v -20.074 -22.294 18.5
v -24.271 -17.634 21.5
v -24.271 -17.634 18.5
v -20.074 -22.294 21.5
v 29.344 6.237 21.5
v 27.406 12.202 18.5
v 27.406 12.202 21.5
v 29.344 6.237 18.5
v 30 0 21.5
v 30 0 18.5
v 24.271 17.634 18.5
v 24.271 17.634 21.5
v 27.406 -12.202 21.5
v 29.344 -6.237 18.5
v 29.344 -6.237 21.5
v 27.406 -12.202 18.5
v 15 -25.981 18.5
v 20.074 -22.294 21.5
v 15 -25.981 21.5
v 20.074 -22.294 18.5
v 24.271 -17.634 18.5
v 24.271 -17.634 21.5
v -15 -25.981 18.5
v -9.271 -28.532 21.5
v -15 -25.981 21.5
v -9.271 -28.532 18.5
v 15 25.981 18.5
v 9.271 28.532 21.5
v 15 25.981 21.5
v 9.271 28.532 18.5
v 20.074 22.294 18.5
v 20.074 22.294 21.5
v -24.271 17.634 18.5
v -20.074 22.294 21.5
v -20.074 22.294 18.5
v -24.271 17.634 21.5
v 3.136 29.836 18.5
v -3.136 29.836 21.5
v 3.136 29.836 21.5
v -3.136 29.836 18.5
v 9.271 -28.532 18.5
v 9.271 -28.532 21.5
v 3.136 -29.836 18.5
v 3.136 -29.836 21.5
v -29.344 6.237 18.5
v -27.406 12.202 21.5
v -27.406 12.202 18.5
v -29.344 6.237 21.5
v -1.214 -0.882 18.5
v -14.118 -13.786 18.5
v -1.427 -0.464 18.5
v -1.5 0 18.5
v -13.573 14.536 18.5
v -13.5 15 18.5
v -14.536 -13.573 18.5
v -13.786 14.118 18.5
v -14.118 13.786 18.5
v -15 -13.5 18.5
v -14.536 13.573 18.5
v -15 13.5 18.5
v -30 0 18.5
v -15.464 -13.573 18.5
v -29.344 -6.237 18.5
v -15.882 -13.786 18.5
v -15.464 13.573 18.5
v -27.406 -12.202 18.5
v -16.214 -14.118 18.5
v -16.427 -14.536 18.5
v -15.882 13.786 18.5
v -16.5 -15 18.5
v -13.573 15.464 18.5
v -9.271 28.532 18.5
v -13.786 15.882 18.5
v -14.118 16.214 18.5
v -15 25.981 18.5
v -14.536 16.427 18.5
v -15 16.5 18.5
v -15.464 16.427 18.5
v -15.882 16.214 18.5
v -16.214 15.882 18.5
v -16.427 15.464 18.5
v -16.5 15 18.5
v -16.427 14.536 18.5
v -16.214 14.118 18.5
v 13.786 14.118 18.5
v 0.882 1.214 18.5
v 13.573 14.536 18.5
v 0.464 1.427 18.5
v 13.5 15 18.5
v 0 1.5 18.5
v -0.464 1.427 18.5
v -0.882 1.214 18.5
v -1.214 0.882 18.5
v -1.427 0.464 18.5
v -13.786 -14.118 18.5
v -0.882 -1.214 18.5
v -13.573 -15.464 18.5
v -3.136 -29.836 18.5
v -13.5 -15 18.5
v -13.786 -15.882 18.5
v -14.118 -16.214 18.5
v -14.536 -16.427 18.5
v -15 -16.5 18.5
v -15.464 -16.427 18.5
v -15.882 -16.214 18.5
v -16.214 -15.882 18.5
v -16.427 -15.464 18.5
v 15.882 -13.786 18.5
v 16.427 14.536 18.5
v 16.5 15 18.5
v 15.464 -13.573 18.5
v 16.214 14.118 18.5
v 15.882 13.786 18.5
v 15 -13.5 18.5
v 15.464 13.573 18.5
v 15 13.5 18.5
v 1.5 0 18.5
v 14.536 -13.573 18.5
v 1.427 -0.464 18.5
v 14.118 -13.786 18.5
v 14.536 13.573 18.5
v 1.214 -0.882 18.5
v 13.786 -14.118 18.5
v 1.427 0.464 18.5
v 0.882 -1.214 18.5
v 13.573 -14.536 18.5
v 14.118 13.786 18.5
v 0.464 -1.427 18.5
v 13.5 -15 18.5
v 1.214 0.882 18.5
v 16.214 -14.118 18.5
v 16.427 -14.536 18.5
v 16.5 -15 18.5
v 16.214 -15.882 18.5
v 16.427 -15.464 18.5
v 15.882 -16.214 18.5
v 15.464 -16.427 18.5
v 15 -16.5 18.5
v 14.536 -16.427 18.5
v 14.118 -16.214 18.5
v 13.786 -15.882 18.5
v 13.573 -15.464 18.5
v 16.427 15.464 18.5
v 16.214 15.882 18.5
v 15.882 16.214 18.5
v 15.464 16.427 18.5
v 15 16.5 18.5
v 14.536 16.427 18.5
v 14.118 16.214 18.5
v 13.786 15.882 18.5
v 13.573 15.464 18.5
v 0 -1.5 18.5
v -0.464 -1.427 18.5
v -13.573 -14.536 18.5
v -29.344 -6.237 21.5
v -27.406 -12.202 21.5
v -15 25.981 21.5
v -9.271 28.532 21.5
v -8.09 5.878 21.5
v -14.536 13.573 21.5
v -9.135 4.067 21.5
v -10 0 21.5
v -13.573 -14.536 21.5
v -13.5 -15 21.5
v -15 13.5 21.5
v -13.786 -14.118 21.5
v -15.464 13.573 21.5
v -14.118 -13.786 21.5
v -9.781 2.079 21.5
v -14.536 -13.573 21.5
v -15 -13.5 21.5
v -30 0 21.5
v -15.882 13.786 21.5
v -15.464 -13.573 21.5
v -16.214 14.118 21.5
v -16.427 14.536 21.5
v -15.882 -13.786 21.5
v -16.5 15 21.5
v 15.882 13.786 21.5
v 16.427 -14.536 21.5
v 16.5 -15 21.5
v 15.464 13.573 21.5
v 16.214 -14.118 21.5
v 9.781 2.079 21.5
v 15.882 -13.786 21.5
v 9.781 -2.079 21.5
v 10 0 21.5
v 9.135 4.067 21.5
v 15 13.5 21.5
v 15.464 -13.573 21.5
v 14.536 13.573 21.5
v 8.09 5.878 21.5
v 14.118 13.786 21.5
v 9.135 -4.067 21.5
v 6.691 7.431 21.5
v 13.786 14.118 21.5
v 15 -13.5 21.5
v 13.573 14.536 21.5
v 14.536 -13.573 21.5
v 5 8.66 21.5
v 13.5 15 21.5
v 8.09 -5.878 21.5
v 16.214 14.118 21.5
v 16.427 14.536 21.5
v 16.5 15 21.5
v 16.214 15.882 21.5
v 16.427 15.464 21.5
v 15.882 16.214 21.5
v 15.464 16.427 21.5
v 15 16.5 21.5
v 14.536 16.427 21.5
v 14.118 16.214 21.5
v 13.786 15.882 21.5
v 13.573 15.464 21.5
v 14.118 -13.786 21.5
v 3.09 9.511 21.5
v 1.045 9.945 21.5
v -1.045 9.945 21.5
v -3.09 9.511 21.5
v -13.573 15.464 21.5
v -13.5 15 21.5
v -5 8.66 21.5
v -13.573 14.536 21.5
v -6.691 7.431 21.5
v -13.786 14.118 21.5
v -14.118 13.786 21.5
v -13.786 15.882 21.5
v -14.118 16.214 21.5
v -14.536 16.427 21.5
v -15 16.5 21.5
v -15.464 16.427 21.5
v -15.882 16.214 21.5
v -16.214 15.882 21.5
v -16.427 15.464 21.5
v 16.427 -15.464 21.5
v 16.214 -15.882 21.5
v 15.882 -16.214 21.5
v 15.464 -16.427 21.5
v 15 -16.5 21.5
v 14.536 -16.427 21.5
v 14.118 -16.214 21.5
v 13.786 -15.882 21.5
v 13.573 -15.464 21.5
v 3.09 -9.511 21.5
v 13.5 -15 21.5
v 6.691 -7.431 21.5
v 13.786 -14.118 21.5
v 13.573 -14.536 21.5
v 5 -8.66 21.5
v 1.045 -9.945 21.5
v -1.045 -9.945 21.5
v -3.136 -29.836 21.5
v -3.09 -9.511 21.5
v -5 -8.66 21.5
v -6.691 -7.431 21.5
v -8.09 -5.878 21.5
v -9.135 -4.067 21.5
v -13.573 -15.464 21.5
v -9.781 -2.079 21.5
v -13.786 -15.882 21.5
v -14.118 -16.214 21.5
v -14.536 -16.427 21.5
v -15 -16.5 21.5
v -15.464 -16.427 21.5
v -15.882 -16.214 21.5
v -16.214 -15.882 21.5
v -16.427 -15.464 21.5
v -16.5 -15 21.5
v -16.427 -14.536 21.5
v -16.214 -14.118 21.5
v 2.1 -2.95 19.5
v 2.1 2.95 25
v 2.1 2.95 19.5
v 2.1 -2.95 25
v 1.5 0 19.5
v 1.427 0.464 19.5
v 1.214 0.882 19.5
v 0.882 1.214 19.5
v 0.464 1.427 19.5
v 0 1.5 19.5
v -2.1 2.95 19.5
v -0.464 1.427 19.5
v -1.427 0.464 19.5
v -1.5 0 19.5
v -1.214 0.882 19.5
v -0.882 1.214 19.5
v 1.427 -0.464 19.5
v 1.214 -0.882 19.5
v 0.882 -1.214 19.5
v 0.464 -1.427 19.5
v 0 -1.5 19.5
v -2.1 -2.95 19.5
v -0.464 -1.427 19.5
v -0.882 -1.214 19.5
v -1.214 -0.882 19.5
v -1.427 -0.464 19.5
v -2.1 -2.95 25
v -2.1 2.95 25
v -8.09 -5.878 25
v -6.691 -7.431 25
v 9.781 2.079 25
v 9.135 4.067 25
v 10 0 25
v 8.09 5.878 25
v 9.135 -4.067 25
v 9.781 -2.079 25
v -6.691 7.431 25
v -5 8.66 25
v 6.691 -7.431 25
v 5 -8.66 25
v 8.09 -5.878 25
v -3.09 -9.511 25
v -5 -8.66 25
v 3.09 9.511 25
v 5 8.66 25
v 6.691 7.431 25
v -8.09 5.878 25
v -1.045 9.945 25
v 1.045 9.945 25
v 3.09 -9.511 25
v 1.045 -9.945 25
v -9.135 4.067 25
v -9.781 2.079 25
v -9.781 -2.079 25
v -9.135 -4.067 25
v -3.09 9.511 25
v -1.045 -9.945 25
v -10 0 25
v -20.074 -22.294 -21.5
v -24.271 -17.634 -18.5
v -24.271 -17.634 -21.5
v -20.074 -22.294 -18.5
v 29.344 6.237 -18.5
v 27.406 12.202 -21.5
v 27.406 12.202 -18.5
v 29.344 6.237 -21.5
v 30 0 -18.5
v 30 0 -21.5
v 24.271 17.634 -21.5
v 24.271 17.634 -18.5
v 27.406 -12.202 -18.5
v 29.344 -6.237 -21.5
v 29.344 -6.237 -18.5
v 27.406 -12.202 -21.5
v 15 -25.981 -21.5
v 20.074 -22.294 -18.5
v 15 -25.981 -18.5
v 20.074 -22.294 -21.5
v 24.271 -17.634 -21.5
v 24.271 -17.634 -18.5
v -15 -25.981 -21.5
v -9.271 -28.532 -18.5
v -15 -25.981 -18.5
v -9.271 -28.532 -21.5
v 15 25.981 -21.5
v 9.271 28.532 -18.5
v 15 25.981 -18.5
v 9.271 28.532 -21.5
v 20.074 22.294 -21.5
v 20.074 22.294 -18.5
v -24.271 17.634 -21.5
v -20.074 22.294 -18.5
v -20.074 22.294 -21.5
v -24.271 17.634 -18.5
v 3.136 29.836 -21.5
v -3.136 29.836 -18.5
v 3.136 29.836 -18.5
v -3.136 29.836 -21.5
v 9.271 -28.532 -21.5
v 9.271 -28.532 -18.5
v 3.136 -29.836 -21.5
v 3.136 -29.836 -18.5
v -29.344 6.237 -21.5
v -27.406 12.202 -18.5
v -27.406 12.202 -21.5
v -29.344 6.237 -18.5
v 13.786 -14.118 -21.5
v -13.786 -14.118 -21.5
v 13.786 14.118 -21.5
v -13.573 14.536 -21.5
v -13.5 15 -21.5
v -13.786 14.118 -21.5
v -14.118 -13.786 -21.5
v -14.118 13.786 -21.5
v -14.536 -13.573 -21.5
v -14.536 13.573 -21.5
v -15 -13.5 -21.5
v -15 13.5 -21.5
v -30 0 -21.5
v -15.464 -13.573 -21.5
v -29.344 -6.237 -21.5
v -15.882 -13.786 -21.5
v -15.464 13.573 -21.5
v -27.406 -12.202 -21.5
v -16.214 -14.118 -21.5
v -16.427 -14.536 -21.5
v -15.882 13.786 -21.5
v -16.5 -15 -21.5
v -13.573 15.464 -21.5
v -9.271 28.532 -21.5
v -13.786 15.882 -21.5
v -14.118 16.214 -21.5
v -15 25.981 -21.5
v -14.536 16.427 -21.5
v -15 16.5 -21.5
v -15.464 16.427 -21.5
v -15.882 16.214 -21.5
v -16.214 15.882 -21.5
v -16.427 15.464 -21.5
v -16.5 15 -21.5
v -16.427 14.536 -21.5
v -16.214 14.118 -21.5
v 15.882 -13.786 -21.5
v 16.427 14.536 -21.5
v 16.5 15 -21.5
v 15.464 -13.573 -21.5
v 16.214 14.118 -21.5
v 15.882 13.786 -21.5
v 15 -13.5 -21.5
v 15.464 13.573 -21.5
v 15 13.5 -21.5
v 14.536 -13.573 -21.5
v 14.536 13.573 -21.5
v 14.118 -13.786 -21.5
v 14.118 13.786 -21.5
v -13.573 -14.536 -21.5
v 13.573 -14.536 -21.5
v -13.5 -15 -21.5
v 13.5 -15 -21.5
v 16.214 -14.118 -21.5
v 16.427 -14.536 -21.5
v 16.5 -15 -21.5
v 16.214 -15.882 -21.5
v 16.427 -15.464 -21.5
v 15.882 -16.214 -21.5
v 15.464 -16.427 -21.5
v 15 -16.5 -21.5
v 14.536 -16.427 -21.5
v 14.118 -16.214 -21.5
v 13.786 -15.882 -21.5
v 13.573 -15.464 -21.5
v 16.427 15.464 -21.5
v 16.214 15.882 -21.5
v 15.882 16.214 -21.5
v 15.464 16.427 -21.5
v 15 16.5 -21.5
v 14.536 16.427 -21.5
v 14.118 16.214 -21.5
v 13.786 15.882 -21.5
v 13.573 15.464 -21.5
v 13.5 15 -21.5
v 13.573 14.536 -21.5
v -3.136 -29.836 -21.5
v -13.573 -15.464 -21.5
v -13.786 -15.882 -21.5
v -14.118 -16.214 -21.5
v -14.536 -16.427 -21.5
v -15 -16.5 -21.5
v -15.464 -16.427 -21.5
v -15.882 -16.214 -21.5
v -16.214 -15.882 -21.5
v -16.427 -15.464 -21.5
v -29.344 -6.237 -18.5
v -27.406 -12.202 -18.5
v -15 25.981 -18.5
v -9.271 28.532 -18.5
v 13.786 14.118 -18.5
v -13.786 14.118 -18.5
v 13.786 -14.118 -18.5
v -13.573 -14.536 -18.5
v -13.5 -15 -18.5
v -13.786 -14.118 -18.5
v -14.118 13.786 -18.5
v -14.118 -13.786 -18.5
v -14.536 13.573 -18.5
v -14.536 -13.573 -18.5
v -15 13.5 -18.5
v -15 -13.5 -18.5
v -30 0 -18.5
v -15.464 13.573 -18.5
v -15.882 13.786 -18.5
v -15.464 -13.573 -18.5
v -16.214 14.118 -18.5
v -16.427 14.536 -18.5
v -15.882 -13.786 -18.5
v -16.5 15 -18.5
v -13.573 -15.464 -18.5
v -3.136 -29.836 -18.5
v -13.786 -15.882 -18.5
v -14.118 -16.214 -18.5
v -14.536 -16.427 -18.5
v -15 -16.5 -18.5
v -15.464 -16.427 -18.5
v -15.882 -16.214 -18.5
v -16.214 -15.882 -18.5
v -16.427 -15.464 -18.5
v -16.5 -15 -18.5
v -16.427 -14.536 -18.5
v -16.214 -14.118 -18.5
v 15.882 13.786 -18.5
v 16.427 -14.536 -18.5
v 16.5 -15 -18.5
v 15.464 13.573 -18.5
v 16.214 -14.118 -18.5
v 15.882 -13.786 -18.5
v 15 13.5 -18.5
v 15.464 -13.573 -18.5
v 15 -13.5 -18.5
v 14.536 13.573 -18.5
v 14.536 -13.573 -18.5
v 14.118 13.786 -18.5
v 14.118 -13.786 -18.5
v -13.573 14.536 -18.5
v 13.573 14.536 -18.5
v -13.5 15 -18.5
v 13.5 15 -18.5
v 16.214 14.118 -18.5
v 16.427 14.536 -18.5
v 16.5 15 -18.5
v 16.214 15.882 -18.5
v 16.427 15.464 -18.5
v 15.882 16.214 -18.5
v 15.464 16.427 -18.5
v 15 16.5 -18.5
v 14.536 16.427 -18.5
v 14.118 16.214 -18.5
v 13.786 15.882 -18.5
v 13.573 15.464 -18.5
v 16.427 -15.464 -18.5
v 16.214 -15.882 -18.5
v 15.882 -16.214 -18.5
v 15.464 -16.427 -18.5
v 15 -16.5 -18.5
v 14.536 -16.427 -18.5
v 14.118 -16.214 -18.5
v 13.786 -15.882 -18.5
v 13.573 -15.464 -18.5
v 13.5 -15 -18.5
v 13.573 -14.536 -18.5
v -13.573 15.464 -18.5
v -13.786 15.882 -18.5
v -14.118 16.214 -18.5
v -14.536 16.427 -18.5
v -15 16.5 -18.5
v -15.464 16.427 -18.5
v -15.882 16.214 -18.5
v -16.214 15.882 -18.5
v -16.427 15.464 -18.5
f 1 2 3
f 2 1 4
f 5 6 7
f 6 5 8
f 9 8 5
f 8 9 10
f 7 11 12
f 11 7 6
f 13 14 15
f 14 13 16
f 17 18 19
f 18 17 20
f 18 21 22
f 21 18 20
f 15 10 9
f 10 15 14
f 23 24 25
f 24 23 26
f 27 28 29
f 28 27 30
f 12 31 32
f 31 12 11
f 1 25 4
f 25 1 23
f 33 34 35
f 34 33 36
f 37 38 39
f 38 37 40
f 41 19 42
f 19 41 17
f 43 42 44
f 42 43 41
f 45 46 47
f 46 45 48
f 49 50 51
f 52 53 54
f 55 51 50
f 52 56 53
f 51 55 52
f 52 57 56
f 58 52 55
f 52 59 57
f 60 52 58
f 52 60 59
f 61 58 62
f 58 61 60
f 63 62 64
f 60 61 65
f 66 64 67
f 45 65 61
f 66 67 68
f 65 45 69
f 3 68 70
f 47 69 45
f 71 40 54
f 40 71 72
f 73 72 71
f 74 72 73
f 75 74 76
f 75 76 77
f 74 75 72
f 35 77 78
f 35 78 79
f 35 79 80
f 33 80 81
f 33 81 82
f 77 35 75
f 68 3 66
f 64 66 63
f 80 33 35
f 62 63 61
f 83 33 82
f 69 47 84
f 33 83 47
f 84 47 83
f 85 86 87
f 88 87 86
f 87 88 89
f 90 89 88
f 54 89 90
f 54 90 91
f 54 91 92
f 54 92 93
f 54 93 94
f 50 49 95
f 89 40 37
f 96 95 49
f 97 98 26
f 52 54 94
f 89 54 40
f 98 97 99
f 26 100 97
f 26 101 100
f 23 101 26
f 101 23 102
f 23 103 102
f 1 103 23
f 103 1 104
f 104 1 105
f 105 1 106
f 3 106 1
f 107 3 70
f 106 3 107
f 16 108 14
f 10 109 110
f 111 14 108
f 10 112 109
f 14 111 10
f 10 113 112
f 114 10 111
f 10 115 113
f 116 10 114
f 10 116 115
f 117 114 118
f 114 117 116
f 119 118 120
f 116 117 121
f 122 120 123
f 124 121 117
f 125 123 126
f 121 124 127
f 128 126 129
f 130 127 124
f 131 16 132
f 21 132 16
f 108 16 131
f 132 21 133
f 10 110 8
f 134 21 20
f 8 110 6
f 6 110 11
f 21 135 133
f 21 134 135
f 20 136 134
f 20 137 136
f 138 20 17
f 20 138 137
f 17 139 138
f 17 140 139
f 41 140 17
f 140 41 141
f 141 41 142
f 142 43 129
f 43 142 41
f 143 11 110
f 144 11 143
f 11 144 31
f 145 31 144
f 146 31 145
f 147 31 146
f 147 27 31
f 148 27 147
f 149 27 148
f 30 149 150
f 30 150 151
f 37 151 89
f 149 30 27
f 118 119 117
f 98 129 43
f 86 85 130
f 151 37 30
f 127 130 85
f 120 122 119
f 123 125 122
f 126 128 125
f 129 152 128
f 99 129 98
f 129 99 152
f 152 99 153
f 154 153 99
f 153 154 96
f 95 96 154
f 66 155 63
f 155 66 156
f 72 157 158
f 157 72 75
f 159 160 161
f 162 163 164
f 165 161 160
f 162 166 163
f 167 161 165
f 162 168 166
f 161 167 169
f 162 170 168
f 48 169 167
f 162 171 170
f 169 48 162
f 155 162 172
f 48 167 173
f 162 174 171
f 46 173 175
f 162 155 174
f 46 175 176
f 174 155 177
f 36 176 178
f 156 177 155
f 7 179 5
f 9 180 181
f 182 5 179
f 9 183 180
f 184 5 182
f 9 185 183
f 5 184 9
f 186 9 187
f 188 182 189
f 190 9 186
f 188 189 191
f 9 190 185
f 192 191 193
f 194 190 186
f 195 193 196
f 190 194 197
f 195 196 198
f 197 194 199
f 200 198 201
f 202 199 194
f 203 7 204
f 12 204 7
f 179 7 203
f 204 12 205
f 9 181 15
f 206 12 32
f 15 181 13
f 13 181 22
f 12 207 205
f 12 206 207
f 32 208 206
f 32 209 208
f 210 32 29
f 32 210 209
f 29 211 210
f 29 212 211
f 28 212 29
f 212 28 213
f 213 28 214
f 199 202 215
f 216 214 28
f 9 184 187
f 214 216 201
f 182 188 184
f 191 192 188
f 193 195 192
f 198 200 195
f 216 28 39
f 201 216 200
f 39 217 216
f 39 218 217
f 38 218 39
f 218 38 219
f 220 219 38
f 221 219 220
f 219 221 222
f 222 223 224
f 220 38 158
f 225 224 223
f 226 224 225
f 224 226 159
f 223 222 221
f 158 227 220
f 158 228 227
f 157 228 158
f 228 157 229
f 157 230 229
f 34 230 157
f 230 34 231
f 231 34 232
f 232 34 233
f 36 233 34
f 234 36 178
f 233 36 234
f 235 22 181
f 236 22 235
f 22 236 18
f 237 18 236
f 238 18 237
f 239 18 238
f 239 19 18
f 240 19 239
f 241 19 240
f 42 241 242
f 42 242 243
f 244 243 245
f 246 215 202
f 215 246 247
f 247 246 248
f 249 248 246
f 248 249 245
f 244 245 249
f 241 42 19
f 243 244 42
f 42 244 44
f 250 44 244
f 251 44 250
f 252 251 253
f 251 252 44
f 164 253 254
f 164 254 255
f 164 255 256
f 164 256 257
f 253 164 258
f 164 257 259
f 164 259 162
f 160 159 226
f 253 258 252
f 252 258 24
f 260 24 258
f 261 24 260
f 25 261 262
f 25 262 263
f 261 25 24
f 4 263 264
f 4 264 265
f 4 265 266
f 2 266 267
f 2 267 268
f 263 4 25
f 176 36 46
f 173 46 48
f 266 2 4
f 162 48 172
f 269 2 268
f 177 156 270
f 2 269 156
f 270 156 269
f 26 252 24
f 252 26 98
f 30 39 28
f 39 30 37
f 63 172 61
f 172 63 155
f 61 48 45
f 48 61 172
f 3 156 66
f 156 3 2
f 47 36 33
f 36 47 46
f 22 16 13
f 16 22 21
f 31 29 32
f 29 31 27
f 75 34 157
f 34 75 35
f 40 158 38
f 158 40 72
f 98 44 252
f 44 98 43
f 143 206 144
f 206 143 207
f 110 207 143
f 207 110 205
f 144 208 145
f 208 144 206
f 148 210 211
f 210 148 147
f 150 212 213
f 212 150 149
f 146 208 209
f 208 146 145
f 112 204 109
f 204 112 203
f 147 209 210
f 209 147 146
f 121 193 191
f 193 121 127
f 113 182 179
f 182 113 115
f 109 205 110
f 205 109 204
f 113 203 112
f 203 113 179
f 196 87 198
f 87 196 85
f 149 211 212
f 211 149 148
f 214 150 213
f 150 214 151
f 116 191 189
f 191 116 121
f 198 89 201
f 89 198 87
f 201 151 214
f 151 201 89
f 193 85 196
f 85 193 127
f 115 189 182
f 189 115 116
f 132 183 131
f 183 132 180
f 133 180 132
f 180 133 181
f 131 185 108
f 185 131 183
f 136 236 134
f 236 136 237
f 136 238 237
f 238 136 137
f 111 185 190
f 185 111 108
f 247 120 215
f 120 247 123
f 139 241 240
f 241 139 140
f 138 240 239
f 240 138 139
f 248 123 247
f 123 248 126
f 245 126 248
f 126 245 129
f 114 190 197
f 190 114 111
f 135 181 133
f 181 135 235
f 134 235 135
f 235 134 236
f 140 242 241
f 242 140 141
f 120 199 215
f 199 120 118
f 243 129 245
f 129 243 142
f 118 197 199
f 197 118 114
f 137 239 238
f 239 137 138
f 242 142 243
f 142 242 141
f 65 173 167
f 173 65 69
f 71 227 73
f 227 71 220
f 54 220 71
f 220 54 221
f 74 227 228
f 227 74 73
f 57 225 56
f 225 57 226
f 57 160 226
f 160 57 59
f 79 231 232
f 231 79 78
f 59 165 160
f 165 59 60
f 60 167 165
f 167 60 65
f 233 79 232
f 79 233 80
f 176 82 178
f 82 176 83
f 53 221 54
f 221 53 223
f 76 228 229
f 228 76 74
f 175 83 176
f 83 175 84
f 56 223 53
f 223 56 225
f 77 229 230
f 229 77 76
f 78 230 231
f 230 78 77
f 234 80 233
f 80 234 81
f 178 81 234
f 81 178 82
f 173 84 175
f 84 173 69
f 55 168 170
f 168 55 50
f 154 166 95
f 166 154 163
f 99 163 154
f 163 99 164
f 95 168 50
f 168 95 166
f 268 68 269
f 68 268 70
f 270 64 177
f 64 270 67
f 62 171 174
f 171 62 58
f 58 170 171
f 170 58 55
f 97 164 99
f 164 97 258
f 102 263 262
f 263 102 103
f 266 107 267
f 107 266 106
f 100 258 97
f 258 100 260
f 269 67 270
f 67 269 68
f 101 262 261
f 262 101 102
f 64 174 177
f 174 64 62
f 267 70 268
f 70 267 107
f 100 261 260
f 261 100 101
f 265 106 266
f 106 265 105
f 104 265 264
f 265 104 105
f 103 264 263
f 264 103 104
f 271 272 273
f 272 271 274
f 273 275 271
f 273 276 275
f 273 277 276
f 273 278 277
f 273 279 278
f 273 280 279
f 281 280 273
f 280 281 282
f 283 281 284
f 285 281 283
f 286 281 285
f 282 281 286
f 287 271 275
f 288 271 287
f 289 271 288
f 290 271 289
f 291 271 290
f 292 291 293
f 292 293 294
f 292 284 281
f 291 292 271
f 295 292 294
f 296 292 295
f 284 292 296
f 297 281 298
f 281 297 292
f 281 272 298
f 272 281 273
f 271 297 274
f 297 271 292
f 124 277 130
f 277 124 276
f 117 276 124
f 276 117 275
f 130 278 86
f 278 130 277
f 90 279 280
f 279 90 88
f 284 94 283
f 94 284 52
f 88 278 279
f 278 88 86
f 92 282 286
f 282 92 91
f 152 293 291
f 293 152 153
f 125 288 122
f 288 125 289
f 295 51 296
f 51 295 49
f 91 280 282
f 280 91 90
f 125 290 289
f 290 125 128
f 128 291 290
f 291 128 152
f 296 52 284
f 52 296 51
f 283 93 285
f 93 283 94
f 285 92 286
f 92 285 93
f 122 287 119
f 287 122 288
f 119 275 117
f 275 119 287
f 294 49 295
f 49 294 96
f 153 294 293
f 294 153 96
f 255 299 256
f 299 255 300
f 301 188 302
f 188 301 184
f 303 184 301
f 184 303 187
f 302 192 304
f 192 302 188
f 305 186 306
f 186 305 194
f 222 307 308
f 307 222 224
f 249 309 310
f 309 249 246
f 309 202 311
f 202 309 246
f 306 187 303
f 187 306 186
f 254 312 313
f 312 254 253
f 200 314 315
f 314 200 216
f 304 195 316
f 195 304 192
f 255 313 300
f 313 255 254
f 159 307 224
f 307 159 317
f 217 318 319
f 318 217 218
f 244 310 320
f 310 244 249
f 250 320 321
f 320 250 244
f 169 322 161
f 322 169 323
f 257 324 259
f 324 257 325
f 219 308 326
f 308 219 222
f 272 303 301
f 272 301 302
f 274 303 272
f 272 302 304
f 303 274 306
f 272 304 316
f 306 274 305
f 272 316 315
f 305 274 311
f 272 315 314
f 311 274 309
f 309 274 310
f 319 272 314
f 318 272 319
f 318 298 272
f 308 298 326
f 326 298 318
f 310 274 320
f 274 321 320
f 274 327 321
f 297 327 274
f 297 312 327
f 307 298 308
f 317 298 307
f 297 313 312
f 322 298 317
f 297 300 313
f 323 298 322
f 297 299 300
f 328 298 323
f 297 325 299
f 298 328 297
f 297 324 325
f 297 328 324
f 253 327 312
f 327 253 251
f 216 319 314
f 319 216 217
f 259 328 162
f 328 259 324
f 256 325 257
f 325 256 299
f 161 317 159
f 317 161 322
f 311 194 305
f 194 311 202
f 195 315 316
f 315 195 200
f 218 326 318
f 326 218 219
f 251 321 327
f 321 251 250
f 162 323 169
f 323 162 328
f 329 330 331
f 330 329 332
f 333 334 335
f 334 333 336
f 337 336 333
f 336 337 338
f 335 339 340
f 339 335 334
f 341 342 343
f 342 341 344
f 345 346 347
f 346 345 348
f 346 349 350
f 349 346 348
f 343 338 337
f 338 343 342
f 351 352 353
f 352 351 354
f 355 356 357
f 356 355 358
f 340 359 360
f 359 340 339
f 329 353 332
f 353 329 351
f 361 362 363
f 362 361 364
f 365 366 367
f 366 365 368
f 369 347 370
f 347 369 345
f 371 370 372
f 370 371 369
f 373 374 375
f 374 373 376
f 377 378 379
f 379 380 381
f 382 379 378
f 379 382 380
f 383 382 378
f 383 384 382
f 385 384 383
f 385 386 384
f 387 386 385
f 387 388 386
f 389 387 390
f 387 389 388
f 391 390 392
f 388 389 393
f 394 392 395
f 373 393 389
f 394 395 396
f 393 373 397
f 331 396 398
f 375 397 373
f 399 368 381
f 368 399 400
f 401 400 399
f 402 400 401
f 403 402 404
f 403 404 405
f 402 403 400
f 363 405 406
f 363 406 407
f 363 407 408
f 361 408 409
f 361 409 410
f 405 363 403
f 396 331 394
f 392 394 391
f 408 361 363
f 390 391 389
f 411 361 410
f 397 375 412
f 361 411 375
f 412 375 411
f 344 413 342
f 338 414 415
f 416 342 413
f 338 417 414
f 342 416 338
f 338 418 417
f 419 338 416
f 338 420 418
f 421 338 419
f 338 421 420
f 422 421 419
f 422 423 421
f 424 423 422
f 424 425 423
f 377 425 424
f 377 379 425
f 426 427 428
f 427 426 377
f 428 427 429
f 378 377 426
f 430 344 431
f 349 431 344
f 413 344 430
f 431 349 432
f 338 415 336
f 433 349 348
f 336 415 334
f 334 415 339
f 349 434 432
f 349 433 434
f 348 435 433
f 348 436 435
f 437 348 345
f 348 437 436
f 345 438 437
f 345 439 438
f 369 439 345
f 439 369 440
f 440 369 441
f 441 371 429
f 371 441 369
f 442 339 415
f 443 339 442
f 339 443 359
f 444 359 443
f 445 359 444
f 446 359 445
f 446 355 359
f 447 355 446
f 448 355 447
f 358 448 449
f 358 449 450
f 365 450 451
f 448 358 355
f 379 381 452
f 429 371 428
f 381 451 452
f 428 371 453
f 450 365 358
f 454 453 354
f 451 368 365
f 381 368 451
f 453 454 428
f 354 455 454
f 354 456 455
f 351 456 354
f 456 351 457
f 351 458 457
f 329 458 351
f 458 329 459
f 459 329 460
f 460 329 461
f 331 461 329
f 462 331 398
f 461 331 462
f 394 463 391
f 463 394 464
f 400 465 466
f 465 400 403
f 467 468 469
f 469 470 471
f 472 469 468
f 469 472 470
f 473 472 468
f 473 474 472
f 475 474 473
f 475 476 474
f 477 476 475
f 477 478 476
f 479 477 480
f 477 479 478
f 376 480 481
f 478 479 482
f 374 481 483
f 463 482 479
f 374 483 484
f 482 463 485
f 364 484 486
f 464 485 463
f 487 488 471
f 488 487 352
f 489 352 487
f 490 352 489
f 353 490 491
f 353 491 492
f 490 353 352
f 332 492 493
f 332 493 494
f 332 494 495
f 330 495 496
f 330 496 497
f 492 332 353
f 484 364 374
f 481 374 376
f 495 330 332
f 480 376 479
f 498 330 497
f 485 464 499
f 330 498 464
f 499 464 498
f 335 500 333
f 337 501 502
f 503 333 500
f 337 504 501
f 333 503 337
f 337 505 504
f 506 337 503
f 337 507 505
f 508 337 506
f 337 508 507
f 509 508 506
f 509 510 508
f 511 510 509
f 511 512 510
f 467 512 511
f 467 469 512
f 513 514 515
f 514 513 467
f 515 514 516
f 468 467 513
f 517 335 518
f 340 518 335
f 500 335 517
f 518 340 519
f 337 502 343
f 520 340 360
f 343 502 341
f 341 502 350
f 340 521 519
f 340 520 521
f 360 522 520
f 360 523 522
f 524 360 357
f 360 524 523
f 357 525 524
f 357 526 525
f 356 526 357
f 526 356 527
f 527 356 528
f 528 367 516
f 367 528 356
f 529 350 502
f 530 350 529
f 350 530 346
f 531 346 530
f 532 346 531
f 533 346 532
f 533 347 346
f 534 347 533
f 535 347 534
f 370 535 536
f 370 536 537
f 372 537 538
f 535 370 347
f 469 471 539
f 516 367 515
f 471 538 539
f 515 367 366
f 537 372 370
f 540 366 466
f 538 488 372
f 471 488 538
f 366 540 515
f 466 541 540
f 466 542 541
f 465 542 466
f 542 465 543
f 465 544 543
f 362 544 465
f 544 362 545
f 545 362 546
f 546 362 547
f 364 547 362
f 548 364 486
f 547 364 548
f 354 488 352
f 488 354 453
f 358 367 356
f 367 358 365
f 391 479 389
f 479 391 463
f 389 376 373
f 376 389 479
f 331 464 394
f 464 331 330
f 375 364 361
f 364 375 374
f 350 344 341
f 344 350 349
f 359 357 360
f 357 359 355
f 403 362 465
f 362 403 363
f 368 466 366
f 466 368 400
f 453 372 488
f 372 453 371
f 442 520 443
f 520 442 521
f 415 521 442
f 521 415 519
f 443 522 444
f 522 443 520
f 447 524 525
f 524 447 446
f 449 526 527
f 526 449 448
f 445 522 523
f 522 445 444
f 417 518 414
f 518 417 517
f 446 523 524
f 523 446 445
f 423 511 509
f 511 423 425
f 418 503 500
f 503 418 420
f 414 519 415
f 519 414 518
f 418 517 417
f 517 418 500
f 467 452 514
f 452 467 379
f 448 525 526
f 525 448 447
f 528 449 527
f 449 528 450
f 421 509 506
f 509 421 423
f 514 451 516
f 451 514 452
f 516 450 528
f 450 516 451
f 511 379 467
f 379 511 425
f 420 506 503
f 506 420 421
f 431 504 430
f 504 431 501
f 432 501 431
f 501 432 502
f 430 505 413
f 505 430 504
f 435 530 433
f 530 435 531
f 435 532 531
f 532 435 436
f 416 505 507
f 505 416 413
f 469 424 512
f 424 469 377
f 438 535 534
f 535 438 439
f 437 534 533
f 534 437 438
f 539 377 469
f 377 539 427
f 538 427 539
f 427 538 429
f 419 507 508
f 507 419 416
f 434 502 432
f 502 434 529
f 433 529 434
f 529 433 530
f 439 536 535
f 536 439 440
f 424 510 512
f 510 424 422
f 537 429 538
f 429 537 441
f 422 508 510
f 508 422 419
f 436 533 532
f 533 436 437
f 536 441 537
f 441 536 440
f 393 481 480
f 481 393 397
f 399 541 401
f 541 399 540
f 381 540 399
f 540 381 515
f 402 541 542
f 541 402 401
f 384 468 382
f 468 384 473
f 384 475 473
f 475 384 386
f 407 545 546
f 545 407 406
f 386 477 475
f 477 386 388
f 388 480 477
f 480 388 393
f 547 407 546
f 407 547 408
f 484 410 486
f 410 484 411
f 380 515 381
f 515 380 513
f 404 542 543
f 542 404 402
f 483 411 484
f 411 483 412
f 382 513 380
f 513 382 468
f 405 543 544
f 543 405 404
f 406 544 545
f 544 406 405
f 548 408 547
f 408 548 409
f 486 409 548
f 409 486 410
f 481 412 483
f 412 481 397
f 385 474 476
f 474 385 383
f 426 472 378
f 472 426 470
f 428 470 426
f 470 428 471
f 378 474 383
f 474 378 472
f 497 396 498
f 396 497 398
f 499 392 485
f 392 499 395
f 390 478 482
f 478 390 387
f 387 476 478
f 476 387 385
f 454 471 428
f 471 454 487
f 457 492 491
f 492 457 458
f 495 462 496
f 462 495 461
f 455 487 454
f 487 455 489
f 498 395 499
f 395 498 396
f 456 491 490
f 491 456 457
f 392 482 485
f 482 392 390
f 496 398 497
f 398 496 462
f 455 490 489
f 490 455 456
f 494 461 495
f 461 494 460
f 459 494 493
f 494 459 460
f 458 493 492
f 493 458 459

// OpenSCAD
module springTrigger(minRadius, maxRadius, vertexCount, startPoint, height) {
	function vertexAt(vertexIndex) = 
		let(fraction = vertexIndex / vertexCount)
		let(angle = fraction * 360) 
		let(lengthFraction = vertexIndex > startPoint ? fraction : startPoint / vertexCount)
		let(length = minRadius + lengthFraction * (maxRadius - minRadius)) 
		[cos(angle) * length, sin(angle) * length];
	
	range = [0:(vertexCount-1)];
	path = [for (i = range) i];
	vertices = [for (i = range) vertexAt(i)];

	linear_extrude(height = height) polygon(points=vertices, paths=[path]);
}

module drawSpring() {
	springTrigger(5,17, 500, 50, 8);
}

module drawTireScrewHole() {
	cylinder(h = 4, r=1.5, center=true, $fn = 20);
}

module drawSimpleTireCylinder() {
	difference() {
		cylinder(h = 3, r=30, center=true);
		translate([15, 15, 0]) drawTireScrewHole();
		translate([15, -15, 0]) drawTireScrewHole();
		translate([-15, 15, 0]) drawTireScrewHole();
		translate([-15, -15, 0]) drawTireScrewHole();
	}
}

module drawInnerTireCylinder() {
	difference() {
		drawSimpleTireCylinder();	
		translate([0, 0, 2]) cube([4.2,5.9,5], center = true);
		drawTireScrewHole();
	}

	
	difference() {
		translate ([0, 0, 2])cylinder(h = 6, r=10, center=true);
		cube([4.2,5.9,15], center = true);
	}
}

module drawOuterTireCylinder() {
	drawSimpleTireCylinder();
}

module drawTire() {
	tireWidth = 40;
	
	//cylinder(h = tireWidth, r=51, center=true);
	color([1,0,0]) translate([0, 0, tireWidth / 2]) drawInnerTireCylinder();
	color([1,0,0]) translate([0, 0, -tireWidth / 2]) drawOuterTireCylinder();
}

drawTire();

module drawAllParts() {
	color([1,1,1]) translate([0,27,0]) rotate([90,90,0]) drawSpring();
	
	tireDistance = 90;
	translate([0,-tireDistance,0]) rotate([90,90,0]) mirror([0,0,1]) drawTire();
	translate([0,tireDistance,0]) rotate([90,90,0]) drawTire();
	
	drawTheRest();
}

//drawAllParts();

// Moottorin kotelon leveä sivu: 22,5mm
// Moottorin kotelon pituus: 64,27mm

// Akselin etäisyys kotelon reunasta: 8,5mm
// Kotelo alkaa levenemään 36,75mm kohdalla

// Moottorin akselin kapea sivu: 3,7mm, leveä sivu: 5,4mm (leveä sivu on kaareva)
// (36,9mm - 18,6mm) / 2 - 2mm = 7,15mm

// Servon akselin kapea sivu: 2,4mm, leveä sivu: 3,0mm 

// 3.05 1.778

module drawTheRest() {
	axisWidth = 23;
	axisDistance = tireDistance - tireWidth / 2 - axisWidth / 2;
	
	color([0,1,0]) {

		//Read axises
		translate([0,-axisDistance,0]) rotate([90,90,0]) cylinder(h = axisWidth, r=3, center=true);
		translate([0,axisDistance,0]) rotate([90,90,0]) cylinder(h = axisWidth, r=3, center=true);

		//Servo axis
		translate([0,20,0]) rotate([90,90,0]) cylinder(h = 10, r=3, center=true);

		translate([0,0,-7]) {
			difference() {
				cube(size = [50,100,2], center = true);
				translate([0,23,0]) cube([35,12,4], center = true);
			}
			
			// Teensy motors 
			translate([5,-45,6]) cube(size = [64.27,22.5,18.6], center = true); 
			translate([5,45,6]) cube(size = [64.27,22.5,18.6], center = true);
			
			// Teensy
			translate([0,-20,2]) cube(size = [30.5,17.8,3], center = true);
			
			// Battery
			translate([0,-20,-6]) cube(size = [40,60,10], center = true);
			
			// Spring servo
			translate([0,5,6]) cube(size = [20,20,10], center = true);
		}		
	}
}
